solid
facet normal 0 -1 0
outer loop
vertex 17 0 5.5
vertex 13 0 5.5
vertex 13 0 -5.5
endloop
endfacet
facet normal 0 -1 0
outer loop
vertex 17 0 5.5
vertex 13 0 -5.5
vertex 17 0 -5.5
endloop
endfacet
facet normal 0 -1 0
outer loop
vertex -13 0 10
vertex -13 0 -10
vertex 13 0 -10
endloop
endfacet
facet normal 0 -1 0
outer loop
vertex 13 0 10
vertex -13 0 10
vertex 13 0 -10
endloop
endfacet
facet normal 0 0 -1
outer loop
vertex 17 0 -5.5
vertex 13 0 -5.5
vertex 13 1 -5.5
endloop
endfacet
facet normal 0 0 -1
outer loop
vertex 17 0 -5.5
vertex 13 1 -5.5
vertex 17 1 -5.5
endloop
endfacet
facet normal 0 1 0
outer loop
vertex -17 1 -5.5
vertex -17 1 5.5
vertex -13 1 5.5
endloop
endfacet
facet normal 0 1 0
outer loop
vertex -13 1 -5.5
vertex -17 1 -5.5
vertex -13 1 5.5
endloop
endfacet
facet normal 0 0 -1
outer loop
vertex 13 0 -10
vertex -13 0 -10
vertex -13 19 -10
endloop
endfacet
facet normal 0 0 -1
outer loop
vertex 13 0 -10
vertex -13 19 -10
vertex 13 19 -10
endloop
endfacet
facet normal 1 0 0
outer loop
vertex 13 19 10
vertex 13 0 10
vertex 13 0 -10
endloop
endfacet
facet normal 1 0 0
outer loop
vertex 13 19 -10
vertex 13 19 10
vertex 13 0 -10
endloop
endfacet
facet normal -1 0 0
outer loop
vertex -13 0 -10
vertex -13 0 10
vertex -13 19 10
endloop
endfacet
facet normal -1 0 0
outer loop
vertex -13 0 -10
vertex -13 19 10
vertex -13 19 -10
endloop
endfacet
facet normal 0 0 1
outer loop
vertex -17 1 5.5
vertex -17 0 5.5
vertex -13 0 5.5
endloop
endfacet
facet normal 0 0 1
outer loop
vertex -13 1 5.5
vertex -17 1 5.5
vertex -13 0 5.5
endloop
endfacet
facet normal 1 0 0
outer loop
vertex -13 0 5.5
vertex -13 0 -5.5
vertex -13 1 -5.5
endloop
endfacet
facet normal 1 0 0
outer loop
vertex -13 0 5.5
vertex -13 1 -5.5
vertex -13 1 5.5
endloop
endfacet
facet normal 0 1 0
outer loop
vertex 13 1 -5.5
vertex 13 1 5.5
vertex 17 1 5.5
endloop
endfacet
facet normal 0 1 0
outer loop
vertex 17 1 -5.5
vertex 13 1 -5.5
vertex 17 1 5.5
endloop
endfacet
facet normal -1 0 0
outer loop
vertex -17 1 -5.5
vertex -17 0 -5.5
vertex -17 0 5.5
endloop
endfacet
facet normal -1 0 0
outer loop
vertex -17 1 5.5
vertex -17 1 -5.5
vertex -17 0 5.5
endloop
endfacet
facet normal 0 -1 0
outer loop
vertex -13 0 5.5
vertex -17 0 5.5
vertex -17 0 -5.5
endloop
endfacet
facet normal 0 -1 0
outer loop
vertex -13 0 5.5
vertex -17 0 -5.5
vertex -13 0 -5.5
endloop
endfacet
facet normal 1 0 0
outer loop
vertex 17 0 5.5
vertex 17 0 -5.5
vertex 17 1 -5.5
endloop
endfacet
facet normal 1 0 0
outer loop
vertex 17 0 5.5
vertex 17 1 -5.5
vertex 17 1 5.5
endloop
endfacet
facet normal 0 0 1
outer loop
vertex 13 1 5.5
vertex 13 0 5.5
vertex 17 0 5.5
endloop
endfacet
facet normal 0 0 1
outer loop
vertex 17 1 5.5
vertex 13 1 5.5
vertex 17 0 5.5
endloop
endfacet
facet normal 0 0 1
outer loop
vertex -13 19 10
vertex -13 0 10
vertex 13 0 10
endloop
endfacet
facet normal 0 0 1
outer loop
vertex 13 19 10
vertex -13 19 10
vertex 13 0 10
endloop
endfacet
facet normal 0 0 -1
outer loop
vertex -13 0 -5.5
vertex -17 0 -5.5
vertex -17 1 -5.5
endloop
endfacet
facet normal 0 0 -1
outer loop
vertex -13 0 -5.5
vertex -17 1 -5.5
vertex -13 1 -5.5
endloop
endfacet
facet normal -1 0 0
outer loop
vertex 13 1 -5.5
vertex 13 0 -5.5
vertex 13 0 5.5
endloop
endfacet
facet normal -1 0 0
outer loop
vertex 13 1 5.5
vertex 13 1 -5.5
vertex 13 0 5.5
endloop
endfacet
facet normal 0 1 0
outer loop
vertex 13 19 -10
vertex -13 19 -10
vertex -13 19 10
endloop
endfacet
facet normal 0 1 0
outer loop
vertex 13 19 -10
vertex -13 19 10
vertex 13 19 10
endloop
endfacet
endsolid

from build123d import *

# Parameters (mm, degrees)
SKIZZE1_W                         = 26
SKIZZE1_H                         = 20
AUFSATZ_LINEAR_AUSTRAGEN1_DEPTH   = 19
SKIZZE2_W                         = 4
SKIZZE2_H                         = 11
AUFSATZ_LINEAR_AUSTRAGEN2_DEPTH   = 1
AUFSATZ_LINEAR_AUSTRAGEN2_2_DEPTH = 1


with BuildPart() as part:
    # Skizze1 → Aufsatz-Linear austragen1 (new body)
    with BuildSketch(Plane(origin=(0, 0, 0), x_dir=(1, 0, 0), z_dir=(0, 1, 0))):
        Rectangle(SKIZZE1_W, SKIZZE1_H)
    extrude(amount=AUFSATZ_LINEAR_AUSTRAGEN1_DEPTH)


with BuildPart() as body_2:
    # Skizze2 → Aufsatz-Linear austragen2 (new body)
    with BuildSketch(Plane.XZ):
        with Locations((-15, 0)):
            Rectangle(SKIZZE2_W, SKIZZE2_H)
    extrude(amount=-AUFSATZ_LINEAR_AUSTRAGEN2_DEPTH)


with BuildPart() as body_3:
    # Skizze2 → Aufsatz-Linear austragen2 2 (new body)
    with BuildSketch(Plane.XZ):
        with Locations((15, 0)):
            Rectangle(SKIZZE2_W, SKIZZE2_H)
    extrude(amount=-AUFSATZ_LINEAR_AUSTRAGEN2_2_DEPTH)


solid = Compound([part.part, body_2.part, body_3.part])
